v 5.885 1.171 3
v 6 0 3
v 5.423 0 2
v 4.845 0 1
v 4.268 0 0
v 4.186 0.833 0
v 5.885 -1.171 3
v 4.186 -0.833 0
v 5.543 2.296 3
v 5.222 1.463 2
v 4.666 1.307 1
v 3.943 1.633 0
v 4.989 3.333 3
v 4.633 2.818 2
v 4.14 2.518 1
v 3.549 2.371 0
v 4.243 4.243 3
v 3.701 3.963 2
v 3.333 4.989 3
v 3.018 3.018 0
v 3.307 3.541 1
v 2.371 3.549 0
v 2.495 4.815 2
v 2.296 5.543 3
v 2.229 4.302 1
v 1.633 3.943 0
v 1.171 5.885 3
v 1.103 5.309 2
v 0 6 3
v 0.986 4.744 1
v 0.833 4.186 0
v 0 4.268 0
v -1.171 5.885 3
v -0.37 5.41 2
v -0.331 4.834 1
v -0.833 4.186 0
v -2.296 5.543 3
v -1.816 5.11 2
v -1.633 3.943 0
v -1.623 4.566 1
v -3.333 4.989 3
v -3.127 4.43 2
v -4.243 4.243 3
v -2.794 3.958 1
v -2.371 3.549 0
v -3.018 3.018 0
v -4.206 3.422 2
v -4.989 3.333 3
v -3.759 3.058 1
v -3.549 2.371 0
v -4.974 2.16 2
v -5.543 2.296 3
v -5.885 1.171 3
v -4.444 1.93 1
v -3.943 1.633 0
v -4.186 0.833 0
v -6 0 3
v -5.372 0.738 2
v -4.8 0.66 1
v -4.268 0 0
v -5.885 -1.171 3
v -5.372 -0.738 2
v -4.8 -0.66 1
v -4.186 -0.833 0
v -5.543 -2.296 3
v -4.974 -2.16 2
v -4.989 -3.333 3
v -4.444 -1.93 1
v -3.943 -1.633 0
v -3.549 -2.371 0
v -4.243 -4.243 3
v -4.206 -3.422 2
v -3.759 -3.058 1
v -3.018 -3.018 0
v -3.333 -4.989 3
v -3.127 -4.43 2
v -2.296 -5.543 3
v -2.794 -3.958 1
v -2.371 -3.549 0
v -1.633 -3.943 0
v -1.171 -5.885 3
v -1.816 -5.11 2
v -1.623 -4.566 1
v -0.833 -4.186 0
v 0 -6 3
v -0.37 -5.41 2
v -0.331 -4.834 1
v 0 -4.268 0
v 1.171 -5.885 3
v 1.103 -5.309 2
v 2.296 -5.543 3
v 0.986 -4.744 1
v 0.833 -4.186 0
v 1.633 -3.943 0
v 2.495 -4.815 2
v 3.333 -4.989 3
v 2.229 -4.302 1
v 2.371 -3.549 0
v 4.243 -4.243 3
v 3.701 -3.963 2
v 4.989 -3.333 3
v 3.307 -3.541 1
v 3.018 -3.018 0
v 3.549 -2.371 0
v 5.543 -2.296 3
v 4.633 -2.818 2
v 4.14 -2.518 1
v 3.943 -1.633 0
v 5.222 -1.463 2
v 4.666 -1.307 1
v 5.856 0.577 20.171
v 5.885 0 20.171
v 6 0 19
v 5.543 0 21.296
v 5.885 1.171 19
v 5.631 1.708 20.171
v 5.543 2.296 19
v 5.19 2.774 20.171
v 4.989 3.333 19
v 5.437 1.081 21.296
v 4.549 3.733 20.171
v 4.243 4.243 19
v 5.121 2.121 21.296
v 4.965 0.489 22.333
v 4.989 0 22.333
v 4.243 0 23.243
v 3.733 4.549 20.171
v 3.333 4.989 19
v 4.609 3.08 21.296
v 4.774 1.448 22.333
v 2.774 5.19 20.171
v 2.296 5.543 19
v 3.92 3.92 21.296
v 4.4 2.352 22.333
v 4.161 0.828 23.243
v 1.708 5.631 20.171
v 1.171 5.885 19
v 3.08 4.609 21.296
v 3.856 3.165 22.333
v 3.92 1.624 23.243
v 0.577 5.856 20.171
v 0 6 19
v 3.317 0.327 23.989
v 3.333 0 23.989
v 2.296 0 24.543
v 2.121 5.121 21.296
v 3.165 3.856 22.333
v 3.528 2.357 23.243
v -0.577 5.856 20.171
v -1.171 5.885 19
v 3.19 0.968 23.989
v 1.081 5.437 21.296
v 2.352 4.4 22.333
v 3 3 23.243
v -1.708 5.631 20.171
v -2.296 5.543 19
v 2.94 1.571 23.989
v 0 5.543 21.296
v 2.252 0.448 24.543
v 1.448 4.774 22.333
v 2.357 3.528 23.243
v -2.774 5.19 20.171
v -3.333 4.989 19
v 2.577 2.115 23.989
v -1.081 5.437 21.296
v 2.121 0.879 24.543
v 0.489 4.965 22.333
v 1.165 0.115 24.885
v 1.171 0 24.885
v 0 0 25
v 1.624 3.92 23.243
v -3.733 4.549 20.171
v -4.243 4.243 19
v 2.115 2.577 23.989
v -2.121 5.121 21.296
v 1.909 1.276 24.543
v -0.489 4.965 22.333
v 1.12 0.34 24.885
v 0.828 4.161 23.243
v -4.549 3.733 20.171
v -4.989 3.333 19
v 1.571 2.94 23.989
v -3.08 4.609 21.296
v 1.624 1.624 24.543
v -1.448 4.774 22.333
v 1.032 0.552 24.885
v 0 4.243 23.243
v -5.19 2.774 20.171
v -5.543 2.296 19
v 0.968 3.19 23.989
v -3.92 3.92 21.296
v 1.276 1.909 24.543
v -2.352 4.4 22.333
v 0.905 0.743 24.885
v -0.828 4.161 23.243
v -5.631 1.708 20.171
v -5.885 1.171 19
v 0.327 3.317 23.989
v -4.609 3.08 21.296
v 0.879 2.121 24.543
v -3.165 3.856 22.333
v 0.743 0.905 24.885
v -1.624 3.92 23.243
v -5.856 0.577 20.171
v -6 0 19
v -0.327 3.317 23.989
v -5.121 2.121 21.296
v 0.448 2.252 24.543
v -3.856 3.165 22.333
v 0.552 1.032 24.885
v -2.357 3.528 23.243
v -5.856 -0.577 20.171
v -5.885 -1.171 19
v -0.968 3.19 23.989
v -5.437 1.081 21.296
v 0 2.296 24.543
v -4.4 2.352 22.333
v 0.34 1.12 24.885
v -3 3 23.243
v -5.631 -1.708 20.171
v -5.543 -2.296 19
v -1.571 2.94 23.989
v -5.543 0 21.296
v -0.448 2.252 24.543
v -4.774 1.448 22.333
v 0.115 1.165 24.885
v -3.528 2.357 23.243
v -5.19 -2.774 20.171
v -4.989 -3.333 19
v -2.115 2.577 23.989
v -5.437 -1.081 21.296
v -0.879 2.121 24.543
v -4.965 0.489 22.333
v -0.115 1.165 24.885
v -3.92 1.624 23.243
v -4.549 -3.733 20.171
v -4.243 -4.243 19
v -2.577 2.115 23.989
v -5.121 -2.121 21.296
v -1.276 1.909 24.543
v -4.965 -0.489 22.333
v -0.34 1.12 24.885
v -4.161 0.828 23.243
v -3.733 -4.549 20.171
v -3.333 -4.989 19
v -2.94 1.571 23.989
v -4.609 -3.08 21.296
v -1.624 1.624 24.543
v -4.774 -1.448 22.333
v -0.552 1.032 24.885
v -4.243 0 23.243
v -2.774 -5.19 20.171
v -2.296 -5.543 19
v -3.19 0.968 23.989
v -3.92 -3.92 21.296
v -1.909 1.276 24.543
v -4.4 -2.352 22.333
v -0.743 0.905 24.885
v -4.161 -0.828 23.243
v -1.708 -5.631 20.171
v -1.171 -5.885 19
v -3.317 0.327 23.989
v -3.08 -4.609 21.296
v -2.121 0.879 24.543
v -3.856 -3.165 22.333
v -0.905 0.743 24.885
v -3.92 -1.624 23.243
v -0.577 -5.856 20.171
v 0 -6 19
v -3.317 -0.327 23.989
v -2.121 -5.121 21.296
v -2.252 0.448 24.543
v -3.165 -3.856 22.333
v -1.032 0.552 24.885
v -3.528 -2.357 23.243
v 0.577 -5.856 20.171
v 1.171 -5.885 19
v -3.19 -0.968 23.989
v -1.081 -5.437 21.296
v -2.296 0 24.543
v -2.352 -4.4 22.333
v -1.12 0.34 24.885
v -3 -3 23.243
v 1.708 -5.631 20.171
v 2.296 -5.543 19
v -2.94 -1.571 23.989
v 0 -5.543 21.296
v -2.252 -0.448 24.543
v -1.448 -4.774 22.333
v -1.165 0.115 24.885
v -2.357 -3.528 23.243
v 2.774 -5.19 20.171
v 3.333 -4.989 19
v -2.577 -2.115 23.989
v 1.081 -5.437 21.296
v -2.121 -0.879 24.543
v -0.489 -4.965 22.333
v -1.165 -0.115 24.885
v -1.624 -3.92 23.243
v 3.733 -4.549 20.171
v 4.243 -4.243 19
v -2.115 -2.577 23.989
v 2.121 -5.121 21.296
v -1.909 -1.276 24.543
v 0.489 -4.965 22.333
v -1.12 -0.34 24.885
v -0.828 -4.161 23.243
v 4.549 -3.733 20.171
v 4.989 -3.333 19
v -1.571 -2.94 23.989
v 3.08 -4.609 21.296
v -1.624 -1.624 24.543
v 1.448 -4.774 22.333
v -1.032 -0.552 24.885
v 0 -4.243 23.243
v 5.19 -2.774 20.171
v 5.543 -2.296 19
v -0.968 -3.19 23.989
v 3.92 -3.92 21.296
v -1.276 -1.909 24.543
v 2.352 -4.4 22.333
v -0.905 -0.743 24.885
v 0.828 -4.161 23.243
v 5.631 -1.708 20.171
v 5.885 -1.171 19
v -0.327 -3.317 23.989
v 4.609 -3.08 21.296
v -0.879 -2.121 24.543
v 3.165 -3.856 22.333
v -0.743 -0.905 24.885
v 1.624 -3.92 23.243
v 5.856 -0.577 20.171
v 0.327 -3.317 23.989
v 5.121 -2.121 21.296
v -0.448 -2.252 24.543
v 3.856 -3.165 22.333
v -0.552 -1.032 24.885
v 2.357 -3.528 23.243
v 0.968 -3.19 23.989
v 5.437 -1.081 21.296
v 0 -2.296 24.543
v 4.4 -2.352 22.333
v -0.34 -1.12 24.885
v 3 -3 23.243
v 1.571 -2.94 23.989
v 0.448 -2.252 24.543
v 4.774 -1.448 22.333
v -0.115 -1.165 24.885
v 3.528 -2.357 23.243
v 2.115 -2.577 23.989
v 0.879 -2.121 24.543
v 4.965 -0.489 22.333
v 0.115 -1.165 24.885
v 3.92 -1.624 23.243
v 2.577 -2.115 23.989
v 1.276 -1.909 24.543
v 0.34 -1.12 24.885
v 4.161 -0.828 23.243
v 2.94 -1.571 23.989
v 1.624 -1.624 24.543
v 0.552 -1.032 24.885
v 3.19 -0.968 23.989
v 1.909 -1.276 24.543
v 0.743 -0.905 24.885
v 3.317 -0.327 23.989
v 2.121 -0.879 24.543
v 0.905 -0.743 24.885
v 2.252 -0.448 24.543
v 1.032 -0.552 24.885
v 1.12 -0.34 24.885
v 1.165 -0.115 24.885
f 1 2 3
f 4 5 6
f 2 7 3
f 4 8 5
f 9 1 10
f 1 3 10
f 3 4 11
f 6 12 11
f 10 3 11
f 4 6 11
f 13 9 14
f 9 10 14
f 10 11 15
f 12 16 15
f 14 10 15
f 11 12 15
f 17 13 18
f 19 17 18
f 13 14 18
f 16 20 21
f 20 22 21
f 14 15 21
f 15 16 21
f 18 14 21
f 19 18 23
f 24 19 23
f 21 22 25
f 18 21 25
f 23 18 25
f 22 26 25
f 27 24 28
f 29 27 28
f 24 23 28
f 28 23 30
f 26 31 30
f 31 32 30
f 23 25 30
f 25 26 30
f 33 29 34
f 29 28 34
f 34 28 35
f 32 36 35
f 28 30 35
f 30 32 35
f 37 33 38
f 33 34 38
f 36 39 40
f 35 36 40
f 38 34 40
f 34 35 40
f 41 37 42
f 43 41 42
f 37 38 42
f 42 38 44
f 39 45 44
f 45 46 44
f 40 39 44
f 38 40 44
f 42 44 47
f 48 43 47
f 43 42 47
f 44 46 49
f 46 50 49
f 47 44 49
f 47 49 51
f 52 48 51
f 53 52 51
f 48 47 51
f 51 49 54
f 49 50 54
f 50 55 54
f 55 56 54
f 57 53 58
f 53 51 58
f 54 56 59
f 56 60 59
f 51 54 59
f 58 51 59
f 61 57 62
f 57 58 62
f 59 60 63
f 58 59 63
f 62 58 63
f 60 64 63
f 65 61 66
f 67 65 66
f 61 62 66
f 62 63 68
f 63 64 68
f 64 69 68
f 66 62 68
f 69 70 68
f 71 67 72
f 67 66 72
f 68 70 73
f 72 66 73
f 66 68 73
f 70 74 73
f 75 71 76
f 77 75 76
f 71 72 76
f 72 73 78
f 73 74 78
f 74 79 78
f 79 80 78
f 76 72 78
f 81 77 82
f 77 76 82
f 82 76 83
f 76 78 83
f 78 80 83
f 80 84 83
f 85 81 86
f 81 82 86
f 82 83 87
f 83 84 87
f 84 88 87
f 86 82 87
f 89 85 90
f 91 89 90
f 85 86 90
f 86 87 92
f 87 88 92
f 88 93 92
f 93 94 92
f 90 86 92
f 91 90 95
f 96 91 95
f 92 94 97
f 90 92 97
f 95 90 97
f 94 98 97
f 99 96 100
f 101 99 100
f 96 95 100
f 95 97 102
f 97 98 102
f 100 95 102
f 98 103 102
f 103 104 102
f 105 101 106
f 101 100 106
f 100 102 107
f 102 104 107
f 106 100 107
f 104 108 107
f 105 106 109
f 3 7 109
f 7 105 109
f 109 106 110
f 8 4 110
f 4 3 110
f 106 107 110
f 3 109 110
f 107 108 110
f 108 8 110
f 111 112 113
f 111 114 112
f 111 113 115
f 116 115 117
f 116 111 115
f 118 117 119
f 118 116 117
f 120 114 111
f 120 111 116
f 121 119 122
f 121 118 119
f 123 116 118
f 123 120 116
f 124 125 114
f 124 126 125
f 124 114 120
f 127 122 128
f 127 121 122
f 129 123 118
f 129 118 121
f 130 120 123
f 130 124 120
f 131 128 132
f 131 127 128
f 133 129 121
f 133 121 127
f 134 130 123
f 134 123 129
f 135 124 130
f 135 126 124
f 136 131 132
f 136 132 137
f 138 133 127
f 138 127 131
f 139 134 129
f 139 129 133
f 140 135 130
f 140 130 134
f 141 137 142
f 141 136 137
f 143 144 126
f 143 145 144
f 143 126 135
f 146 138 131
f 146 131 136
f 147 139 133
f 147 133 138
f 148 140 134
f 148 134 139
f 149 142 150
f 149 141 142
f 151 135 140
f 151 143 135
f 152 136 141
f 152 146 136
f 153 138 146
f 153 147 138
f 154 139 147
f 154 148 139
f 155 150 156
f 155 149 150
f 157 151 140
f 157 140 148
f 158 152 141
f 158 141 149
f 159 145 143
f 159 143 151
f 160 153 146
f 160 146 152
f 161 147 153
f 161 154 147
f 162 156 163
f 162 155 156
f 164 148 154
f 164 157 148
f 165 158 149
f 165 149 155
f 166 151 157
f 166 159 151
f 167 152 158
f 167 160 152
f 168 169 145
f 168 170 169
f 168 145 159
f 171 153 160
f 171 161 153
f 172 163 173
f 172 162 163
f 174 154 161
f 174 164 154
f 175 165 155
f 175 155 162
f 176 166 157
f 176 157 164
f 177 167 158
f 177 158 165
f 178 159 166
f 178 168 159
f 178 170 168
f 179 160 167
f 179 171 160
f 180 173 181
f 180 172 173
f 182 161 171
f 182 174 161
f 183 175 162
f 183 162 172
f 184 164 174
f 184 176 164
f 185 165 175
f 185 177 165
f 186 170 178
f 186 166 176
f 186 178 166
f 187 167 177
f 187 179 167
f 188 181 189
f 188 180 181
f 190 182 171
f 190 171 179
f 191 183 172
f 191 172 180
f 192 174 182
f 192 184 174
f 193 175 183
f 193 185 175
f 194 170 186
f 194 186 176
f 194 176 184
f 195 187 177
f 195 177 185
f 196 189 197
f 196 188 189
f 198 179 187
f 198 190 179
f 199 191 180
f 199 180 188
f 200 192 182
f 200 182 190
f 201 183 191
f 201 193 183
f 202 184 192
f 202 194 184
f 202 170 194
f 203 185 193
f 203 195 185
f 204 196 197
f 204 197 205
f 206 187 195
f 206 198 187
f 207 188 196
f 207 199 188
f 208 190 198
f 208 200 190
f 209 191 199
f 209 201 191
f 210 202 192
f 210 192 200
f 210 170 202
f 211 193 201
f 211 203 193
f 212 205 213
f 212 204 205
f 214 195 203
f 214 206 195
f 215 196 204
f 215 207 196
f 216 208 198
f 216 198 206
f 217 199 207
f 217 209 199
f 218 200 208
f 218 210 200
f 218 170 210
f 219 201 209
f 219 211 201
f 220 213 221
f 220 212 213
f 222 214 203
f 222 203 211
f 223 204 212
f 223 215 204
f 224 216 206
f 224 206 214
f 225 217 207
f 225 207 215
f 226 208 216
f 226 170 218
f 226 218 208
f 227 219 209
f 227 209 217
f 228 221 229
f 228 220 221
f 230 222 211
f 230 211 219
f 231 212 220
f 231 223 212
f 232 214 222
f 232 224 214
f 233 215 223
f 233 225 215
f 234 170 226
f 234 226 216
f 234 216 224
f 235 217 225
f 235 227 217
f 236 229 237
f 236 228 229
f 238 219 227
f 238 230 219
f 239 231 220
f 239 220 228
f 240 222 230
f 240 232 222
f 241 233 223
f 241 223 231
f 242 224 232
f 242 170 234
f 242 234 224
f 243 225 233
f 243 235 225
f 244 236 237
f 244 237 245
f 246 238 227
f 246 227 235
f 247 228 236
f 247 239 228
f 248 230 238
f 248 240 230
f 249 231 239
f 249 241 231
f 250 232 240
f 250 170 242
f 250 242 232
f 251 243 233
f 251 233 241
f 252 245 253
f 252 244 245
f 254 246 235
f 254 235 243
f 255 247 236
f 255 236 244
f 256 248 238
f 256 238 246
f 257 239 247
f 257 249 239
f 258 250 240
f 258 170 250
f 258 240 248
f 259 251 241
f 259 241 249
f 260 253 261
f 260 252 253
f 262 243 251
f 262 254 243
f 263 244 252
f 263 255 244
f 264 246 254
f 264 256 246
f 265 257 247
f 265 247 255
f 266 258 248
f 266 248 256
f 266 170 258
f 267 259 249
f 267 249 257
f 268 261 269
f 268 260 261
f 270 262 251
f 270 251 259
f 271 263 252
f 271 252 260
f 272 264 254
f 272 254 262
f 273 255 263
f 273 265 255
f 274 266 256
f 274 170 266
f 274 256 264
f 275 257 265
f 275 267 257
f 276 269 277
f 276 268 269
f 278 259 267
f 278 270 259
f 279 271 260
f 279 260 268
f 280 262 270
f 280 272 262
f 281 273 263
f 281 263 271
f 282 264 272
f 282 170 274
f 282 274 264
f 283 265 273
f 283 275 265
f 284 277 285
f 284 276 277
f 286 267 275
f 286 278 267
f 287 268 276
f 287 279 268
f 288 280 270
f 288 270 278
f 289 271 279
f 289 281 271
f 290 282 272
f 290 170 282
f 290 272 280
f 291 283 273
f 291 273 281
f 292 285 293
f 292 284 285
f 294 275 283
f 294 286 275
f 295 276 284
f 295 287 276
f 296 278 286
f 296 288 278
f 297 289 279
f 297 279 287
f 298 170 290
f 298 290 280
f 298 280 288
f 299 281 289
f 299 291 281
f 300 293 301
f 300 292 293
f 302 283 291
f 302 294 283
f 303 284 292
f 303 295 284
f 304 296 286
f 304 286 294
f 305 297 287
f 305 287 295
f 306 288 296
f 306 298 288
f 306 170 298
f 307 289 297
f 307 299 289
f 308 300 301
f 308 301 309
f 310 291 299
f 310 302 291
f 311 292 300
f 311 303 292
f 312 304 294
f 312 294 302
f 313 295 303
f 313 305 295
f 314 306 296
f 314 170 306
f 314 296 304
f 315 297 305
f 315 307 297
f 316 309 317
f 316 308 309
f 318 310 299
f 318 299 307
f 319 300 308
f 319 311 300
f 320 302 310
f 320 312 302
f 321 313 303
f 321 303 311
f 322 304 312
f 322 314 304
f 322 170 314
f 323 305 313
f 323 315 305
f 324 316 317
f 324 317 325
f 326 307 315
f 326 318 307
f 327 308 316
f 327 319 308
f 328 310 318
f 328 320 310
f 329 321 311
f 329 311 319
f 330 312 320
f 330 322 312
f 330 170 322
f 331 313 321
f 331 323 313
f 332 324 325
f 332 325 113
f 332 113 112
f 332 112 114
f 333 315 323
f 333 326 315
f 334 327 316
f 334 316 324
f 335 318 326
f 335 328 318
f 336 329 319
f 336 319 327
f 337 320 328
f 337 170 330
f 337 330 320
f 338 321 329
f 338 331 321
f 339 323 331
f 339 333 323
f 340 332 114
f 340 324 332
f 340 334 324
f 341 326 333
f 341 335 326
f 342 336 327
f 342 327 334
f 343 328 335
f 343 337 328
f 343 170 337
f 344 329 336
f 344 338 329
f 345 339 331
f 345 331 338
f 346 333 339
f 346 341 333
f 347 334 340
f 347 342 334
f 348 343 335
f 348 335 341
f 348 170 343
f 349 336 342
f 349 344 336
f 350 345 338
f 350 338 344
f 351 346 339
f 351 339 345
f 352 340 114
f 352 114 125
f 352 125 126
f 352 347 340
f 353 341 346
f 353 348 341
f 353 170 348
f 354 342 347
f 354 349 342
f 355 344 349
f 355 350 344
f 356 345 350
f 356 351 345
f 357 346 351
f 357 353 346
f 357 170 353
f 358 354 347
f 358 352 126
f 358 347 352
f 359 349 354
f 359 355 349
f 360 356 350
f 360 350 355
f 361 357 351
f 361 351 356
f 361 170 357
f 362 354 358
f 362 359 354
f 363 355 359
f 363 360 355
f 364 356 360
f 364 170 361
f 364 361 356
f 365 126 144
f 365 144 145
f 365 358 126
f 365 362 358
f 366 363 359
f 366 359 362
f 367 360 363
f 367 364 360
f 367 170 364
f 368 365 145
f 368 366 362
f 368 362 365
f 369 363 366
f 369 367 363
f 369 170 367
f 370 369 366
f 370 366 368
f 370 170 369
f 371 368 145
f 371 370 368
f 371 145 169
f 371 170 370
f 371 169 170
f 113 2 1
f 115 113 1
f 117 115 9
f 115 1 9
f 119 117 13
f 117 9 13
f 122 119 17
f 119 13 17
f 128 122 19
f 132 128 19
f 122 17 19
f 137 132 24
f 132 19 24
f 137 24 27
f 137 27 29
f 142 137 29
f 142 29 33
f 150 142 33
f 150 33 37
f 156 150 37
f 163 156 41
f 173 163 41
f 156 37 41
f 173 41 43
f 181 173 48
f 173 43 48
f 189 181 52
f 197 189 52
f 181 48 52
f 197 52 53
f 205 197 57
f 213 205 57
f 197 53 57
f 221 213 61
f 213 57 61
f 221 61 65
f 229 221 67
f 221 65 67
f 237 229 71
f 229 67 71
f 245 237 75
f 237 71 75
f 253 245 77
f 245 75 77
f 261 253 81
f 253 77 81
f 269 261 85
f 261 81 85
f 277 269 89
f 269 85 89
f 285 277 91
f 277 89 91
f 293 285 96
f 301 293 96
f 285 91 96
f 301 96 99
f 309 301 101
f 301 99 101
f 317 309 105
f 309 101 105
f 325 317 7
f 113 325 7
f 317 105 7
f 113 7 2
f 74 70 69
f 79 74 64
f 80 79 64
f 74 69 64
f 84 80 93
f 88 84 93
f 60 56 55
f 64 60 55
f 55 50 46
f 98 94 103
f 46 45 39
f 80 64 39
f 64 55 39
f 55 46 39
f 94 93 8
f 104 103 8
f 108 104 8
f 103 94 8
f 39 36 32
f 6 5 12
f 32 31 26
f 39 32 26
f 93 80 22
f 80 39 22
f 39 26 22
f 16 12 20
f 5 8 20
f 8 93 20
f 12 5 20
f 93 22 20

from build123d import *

# Parameters (mm, degrees)
F0_R     = 6
F1_DEPTH = 25
F2_R     = 6
F3_SIZE2 = 1.732051
F3_SIZE  = 3


with BuildPart() as f1:
    # F0 (on Top) → F1 (new body)
    with BuildSketch(Plane.XY):
        Circle(F0_R)
    extrude(amount=F1_DEPTH)

    # F2
    f2_edges = [f1.edges().sort_by_distance(p)[0] for p in [
        (-6, 0, 25),
    ]]
    fillet(f2_edges, radius=F2_R)

    # F3
    f3_edges = [f1.edges().sort_by_distance(p)[0] for p in [
        (-6, 0, 0),
    ]]
    chamfer(f3_edges, length=F3_SIZE, length2=F3_SIZE2)


solid = f1.part
